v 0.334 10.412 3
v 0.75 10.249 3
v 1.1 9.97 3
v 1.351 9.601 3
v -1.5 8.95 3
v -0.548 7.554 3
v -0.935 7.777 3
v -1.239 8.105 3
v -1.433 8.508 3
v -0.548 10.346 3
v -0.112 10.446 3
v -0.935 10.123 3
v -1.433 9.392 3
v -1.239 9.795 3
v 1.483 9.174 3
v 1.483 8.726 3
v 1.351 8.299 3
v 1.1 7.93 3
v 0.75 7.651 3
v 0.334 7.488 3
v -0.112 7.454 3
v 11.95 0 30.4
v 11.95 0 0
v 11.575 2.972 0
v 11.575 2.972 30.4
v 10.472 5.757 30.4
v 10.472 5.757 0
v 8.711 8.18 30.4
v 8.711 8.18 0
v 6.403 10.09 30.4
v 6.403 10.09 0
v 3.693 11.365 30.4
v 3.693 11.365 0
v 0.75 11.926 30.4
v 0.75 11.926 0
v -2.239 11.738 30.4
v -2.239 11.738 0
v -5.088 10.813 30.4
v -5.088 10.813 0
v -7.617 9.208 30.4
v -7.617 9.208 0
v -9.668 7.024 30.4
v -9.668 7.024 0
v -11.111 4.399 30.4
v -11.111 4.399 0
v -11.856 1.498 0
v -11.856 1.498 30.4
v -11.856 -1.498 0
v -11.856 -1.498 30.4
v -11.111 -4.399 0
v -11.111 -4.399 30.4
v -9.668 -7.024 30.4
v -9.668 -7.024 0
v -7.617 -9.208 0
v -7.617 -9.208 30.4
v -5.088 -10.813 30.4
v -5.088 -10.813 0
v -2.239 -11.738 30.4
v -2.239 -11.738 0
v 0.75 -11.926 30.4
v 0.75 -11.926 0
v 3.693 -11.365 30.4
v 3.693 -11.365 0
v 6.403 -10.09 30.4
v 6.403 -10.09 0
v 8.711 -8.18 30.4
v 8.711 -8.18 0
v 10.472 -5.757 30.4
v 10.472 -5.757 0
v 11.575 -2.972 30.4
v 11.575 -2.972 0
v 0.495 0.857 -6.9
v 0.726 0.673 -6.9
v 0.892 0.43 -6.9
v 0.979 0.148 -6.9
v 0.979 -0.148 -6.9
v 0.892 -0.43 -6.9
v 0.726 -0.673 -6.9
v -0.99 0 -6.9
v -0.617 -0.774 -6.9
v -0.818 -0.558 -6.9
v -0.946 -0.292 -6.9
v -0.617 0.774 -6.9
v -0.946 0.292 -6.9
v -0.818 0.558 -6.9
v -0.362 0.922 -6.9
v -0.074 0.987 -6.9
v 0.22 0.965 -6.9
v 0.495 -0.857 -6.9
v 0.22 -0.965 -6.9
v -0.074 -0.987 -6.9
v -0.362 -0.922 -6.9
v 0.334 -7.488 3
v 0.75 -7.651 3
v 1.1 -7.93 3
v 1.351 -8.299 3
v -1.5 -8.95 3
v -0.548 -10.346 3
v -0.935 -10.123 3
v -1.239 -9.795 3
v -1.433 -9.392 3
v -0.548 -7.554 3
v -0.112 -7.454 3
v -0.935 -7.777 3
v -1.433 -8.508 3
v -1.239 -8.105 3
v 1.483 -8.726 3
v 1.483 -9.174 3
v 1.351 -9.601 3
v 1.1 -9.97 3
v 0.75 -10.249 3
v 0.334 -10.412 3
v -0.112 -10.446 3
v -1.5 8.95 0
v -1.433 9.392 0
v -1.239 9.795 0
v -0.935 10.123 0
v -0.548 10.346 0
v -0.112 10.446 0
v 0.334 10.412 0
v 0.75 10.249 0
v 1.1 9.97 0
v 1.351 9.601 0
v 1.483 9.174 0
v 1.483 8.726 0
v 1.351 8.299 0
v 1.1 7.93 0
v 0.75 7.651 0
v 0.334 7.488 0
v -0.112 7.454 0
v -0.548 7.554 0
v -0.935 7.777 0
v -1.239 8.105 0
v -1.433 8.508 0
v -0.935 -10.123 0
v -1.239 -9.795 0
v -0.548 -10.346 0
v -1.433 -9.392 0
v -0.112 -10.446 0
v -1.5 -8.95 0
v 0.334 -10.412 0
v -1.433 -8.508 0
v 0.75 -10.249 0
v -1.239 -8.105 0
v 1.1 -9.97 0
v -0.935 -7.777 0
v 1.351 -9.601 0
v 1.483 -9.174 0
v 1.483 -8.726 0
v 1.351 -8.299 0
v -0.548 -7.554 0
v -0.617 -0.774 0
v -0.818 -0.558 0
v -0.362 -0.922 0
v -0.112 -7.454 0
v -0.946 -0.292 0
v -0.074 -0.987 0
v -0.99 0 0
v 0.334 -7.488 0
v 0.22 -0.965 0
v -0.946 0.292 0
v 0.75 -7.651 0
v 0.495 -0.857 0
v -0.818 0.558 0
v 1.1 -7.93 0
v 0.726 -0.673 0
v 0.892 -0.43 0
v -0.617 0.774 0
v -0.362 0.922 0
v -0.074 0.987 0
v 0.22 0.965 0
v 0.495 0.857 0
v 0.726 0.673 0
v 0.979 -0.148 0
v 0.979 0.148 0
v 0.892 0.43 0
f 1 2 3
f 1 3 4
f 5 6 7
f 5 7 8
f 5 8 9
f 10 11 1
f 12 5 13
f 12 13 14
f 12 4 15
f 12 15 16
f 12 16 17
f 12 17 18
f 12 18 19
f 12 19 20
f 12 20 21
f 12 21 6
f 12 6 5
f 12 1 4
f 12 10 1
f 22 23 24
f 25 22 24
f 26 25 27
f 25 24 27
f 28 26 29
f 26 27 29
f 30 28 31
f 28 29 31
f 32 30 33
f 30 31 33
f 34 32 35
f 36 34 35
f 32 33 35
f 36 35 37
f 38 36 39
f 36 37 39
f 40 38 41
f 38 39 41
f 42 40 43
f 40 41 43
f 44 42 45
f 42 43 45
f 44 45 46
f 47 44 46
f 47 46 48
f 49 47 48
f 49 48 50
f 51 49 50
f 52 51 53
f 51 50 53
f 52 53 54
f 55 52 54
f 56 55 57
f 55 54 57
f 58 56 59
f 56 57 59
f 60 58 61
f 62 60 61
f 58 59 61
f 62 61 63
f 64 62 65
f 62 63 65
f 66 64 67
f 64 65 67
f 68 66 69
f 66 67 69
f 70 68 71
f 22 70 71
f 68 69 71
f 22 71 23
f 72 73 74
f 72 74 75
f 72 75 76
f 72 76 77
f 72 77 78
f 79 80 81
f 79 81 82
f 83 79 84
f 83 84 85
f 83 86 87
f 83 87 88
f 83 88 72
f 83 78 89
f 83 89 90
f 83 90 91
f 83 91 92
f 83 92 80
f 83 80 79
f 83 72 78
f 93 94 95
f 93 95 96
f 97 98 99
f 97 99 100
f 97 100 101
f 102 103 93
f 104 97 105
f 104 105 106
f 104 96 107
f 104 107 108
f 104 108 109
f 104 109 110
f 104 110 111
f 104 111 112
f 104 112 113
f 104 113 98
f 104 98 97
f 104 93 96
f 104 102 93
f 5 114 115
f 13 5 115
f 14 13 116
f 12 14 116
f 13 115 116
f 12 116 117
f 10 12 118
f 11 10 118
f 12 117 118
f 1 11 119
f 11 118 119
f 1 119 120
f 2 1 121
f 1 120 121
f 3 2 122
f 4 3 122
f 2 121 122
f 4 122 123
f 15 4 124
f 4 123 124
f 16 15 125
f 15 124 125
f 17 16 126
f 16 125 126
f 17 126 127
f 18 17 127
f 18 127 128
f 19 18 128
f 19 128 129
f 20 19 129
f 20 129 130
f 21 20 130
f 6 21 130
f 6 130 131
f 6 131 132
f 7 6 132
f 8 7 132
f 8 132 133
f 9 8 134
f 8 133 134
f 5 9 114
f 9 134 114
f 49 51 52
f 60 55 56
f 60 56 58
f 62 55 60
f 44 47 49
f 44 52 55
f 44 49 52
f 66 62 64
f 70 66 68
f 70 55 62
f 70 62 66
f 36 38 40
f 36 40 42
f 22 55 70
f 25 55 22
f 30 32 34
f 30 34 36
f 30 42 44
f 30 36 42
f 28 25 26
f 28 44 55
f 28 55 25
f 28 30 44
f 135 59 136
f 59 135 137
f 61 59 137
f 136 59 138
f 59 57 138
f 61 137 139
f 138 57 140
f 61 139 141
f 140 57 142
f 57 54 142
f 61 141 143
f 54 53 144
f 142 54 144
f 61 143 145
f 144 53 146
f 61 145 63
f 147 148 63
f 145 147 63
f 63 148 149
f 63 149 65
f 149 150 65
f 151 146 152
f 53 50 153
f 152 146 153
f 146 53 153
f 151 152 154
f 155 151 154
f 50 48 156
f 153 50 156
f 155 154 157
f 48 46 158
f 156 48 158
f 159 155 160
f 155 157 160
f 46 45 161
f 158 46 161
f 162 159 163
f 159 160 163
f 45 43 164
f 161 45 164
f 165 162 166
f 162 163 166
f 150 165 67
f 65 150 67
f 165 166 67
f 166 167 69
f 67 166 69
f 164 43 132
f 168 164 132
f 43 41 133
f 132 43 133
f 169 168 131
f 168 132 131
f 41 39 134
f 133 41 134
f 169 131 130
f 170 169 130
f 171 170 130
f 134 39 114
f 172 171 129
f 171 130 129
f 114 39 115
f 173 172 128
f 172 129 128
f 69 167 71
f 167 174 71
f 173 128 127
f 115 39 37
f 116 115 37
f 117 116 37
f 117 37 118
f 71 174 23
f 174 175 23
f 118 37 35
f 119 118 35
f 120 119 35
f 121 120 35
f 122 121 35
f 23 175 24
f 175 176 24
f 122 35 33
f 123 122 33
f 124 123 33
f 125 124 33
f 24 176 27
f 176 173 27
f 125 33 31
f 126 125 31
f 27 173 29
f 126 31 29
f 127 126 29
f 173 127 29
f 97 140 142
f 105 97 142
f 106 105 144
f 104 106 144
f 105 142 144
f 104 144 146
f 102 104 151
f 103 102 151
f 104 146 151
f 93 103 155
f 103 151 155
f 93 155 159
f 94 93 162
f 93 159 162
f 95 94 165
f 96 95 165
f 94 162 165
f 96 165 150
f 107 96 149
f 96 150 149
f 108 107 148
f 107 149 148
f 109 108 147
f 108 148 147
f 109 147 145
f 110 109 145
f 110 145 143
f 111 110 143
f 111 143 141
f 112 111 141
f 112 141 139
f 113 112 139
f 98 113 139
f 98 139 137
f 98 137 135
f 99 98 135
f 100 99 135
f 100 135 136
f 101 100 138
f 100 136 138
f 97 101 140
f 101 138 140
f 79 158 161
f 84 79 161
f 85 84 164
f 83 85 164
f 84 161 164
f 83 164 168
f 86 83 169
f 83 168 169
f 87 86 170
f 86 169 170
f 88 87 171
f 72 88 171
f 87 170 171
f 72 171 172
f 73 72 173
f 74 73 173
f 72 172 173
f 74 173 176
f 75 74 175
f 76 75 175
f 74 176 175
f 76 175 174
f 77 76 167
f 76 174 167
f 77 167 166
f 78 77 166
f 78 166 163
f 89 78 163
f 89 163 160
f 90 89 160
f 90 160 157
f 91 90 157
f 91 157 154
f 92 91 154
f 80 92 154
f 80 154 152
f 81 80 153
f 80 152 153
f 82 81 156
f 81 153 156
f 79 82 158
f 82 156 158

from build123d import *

# Parameters (mm, degrees)
SKETCH2_R           = 11.95
BOSS_EXTRUDE1_DEPTH = 30.4
SKETCH4_R           = 1.5
CUT_EXTRUDE2_DEPTH  = 3
SKETCH5_R           = 0.99
BOSS_EXTRUDE2_DEPTH = 6.9


with BuildPart() as part:
    # Sketch2 → Boss-Extrude1 (new body)
    with BuildSketch(Plane.XY):
        Circle(SKETCH2_R)
    extrude(amount=BOSS_EXTRUDE1_DEPTH)

    # Sketch4 → Cut-Extrude2 (cut)
    with BuildSketch(Plane(origin=(0, 0, 0), x_dir=(-1, 0, 0), z_dir=(0, 0, -1))):
        with Locations((0, 8.95)):
            Circle(SKETCH4_R)
        with Locations((0, -8.95)):
            Circle(SKETCH4_R)
    extrude(amount=-CUT_EXTRUDE2_DEPTH, mode=Mode.SUBTRACT)

    # Sketch5 → Boss-Extrude2 (add)
    with BuildSketch(Plane(origin=(0, 0, 0), x_dir=(-1, 0, 0), z_dir=(0, 0, -1))):
        Circle(SKETCH5_R)
    extrude(amount=BOSS_EXTRUDE2_DEPTH)


solid = part.part
